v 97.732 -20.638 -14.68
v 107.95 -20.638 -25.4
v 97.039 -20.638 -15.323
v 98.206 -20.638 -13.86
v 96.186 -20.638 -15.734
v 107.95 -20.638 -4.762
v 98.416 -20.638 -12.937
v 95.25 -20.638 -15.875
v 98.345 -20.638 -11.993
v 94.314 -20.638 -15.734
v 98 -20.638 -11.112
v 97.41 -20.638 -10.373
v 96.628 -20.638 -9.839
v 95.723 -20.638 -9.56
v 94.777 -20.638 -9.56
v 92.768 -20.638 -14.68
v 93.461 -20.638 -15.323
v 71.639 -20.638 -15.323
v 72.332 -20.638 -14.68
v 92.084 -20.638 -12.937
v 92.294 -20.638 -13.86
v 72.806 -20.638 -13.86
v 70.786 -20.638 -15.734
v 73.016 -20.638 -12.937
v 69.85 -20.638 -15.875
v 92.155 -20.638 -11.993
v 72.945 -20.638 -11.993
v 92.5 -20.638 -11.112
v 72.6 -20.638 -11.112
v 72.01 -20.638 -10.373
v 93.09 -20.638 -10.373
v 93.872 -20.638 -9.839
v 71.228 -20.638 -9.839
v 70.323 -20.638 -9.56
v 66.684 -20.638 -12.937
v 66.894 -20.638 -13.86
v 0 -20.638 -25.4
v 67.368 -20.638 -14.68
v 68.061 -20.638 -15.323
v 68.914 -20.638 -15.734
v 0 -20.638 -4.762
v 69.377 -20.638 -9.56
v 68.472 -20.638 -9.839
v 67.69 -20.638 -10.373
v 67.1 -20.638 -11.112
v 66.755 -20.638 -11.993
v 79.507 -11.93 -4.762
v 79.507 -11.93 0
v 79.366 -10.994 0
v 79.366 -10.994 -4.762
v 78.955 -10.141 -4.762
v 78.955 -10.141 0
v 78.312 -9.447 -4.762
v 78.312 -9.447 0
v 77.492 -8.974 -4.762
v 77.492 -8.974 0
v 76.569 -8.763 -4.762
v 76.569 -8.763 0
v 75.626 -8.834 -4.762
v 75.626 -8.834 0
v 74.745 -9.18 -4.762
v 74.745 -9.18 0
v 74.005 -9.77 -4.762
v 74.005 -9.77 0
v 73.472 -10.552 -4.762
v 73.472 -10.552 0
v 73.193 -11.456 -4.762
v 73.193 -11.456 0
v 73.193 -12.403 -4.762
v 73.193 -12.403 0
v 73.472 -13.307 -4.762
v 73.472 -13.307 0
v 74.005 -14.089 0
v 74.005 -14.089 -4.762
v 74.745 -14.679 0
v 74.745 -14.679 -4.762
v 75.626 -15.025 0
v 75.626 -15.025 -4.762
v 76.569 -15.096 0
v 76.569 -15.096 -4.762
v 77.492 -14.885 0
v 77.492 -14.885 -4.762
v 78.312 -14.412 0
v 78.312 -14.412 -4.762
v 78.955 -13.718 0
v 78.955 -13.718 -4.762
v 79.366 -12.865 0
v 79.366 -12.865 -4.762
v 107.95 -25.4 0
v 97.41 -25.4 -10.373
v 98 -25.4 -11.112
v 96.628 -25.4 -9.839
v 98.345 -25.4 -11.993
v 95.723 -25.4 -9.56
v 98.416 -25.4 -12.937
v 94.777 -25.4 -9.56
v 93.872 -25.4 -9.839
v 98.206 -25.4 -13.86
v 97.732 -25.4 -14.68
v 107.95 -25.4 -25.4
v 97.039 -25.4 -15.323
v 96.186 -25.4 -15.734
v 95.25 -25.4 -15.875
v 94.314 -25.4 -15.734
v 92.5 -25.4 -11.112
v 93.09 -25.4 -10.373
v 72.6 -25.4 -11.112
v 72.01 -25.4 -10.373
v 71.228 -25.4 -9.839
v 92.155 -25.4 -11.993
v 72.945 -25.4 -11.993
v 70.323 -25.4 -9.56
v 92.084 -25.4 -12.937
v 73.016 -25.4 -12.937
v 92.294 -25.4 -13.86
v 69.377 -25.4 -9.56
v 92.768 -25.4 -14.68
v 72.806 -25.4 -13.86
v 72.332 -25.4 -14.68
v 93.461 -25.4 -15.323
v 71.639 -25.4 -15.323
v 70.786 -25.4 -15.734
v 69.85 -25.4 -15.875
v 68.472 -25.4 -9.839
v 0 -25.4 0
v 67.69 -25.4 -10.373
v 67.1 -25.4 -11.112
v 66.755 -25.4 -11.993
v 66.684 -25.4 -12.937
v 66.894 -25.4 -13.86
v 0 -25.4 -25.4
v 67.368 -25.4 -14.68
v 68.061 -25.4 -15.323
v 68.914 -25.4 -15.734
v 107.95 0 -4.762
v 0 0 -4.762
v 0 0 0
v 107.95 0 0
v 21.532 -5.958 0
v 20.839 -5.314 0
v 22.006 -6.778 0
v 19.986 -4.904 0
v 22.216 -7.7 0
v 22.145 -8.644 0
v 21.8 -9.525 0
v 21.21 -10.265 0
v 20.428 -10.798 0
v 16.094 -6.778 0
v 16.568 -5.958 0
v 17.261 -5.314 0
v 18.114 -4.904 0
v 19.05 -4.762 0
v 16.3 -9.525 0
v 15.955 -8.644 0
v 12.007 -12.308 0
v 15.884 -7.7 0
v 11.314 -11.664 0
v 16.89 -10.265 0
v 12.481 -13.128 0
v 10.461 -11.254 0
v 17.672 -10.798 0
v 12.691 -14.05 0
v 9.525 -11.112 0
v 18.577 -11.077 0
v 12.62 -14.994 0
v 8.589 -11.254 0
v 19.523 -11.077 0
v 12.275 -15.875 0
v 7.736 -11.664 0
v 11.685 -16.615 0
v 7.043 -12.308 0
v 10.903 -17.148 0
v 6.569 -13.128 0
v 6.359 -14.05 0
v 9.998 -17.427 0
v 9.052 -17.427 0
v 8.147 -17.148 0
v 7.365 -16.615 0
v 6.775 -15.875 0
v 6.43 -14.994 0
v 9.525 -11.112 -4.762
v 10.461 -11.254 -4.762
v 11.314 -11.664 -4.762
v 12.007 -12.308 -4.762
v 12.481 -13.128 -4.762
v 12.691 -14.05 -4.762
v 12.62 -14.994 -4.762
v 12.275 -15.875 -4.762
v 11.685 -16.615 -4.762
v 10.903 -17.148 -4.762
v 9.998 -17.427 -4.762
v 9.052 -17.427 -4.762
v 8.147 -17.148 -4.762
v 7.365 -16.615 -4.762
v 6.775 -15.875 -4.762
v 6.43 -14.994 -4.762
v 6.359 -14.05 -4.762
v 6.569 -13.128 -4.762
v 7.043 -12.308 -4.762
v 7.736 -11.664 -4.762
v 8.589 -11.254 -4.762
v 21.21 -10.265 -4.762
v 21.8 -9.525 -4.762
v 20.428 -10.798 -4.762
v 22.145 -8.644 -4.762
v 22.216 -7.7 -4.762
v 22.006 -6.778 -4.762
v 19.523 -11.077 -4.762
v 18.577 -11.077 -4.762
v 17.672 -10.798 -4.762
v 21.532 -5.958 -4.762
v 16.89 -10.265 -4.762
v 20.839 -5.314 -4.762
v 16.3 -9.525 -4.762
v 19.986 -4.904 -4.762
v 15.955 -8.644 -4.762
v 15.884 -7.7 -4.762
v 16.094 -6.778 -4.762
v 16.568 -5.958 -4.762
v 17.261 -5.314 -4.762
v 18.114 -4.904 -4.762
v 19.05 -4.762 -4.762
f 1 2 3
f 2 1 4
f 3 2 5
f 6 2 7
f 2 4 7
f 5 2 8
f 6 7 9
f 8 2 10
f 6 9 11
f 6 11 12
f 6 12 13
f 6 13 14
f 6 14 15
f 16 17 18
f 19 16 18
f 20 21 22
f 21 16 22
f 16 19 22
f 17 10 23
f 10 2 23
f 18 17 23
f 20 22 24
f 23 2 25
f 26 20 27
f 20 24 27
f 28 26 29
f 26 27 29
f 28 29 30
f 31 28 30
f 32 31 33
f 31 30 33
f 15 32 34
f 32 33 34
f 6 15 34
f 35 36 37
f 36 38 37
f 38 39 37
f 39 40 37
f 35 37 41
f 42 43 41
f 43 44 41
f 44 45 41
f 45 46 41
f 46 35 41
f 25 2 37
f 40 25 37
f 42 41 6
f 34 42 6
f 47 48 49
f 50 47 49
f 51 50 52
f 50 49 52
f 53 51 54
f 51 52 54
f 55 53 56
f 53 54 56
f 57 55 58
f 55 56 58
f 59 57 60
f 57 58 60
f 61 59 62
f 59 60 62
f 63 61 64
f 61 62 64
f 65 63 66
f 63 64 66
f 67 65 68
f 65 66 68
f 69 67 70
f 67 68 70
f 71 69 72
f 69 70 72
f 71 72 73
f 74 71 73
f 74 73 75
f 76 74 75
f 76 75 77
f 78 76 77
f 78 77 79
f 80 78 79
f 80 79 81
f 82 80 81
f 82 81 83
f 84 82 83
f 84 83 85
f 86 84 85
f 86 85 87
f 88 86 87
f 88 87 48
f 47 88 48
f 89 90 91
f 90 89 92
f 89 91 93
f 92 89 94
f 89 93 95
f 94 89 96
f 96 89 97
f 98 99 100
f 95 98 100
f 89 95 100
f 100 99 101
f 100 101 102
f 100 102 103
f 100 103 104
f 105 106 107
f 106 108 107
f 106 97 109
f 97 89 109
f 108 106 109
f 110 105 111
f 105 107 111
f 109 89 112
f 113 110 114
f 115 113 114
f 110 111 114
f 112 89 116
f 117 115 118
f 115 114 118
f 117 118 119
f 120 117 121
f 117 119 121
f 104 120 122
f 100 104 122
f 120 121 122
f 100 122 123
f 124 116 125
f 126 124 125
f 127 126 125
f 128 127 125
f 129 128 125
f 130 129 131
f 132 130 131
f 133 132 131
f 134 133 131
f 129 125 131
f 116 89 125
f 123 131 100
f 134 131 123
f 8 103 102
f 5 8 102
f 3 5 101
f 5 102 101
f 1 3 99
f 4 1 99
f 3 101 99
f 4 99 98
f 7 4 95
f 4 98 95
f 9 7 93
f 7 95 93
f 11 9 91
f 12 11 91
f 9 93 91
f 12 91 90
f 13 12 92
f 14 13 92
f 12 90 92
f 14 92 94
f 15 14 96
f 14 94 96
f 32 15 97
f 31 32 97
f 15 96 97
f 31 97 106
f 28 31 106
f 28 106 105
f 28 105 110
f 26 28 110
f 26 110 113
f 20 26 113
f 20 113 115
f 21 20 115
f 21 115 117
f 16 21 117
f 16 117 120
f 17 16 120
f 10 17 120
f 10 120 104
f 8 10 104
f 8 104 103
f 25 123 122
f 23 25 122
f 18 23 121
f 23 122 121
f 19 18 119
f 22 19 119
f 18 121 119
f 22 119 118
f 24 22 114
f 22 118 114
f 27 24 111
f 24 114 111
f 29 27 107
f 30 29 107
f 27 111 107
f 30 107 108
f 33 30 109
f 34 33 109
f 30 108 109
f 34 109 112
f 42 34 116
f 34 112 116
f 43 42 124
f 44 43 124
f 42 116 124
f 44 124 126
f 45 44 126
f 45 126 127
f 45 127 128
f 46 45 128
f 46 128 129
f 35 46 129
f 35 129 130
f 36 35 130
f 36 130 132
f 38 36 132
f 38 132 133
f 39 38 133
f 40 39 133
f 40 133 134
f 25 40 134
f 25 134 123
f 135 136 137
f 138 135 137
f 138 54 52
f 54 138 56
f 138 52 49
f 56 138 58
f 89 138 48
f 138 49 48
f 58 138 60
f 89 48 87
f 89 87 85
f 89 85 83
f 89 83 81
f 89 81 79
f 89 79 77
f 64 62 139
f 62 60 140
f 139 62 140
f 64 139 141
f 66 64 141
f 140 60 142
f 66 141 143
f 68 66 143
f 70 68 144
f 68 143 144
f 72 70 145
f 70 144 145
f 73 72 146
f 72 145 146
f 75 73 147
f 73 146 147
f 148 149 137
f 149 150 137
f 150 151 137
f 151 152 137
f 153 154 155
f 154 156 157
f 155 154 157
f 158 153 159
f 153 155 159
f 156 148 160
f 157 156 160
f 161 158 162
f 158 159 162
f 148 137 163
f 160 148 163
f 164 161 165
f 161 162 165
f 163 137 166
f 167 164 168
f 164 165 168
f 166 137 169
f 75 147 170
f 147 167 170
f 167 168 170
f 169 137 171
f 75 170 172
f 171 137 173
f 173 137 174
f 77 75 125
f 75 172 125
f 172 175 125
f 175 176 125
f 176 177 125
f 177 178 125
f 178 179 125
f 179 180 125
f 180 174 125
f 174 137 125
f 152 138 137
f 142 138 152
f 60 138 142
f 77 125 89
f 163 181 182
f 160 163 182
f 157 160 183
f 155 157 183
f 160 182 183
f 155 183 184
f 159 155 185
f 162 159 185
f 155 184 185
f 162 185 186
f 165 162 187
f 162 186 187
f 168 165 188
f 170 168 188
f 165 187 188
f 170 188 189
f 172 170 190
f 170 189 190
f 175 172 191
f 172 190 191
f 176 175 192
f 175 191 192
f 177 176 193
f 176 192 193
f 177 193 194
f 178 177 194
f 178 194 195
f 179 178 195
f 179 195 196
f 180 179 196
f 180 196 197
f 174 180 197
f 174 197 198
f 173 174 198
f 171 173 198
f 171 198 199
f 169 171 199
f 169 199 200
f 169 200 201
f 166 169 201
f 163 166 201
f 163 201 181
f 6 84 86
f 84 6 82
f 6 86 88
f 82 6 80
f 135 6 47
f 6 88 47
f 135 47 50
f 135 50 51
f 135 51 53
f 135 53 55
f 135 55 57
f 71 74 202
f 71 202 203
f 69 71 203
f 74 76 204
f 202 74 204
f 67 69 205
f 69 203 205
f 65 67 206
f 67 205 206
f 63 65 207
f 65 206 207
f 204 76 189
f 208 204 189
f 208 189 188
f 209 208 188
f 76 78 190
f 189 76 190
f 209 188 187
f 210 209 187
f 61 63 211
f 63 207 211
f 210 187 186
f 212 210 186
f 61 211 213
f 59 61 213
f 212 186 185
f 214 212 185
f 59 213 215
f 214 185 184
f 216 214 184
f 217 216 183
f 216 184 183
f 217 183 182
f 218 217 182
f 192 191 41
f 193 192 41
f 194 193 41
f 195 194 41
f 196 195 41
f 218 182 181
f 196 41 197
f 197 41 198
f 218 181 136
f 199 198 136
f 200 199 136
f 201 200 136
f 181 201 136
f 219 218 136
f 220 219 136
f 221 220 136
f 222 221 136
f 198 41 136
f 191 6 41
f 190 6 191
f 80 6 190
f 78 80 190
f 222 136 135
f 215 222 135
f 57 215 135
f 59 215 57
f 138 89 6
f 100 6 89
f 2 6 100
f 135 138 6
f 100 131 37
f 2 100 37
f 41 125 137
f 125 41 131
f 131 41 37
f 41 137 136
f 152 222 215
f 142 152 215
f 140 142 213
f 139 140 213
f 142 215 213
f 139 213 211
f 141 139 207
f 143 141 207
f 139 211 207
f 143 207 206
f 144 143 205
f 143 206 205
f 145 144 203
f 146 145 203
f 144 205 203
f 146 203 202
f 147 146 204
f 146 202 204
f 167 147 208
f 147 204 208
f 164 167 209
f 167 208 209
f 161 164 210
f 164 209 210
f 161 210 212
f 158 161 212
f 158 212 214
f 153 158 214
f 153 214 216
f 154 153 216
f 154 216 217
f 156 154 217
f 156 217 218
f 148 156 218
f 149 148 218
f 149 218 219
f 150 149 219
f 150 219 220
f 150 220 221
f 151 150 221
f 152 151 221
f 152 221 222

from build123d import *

# Parameters (mm, degrees)
BOSS_EXTRUDE1_DEPTH = 107.95
CUT_EXTRUDE1_REACH  = 114.802
SKETCH3_R           = 3.175
CUT_EXTRUDE2_REACH  = 115.77
SKETCH4_R           = 3.175
CUT_EXTRUDE4_REACH  = 115.77
SKETCH5_R           = 3.175


with BuildPart() as part:
    # Sketch1 → Boss-Extrude1 (new body)
    with BuildSketch(Plane(origin=(0, 0, 0), x_dir=(0, 0, -1), z_dir=(1, 0, 0))):
        Polygon((0, 0), (0, -25.4), (25.4, -25.4), (25.4, -20.6375), (4.7625, -20.6375), (4.7625, 0), align=None)
    extrude(amount=BOSS_EXTRUDE1_DEPTH)

    # Sketch3 → Cut-Extrude1 (cut, up to next)
    with BuildSketch(Plane(origin=(0, 0, -4.7625), x_dir=(-1, 0, 0), z_dir=(0, 0, -1)), mode=Mode.PRIVATE) as cut_extrude1_sk1:
        with Locations(Location((-9.525, -14.2875, 0), (0, 0, 90))):
            Circle(SKETCH3_R)
    cut_extrude1_tool1 = extrude(cut_extrude1_sk1.sketch, amount=-CUT_EXTRUDE1_REACH, mode=Mode.PRIVATE) & part.part
    # Sketch3 → Cut-Extrude1 (cut, up to next)
    with BuildSketch(Plane(origin=(0, 0, -4.7625), x_dir=(-1, 0, 0), z_dir=(0, 0, -1)), mode=Mode.PRIVATE) as cut_extrude1_sk2:
        with Locations(Location((-19.05, -7.9375, 0), (0, 0, 90))):
            Circle(SKETCH3_R)
    cut_extrude1_tool2 = extrude(cut_extrude1_sk2.sketch, amount=-CUT_EXTRUDE1_REACH, mode=Mode.PRIVATE) & part.part
    add(cut_extrude1_tool1.solids().sort_by_distance((9.525, -14.2875, -4.7625))[0], mode=Mode.SUBTRACT)
    add(cut_extrude1_tool2.solids().sort_by_distance((19.05, -7.9375, -4.7625))[0], mode=Mode.SUBTRACT)

    # Sketch4 → Cut-Extrude2 (cut, up to next)
    with BuildSketch(Plane.XY, mode=Mode.PRIVATE) as cut_extrude2_sk1:
        with Locations((76.332177029, -11.929615818)):
            Circle(SKETCH4_R)
    cut_extrude2_tool1 = extrude(cut_extrude2_sk1.sketch, amount=-CUT_EXTRUDE2_REACH, mode=Mode.PRIVATE) & part.part
    add(cut_extrude2_tool1.solids().sort_by_distance((76.332177, -11.929616, 0))[0], mode=Mode.SUBTRACT)

    # Sketch5 → Cut-Extrude4 (cut, up to next)
    with BuildSketch(Plane.XZ.offset(25.4), mode=Mode.PRIVATE) as cut_extrude4_sk1:
        with Locations(Location((69.85, -12.7, 0), (0, 0, 270))):
            Circle(SKETCH5_R)
    cut_extrude4_tool1 = extrude(cut_extrude4_sk1.sketch, amount=-CUT_EXTRUDE4_REACH, mode=Mode.PRIVATE) & part.part
    # Sketch5 → Cut-Extrude4 (cut, up to next)
    with BuildSketch(Plane.XZ.offset(25.4), mode=Mode.PRIVATE) as cut_extrude4_sk2:
        with Locations(Location((95.25, -12.7, 0), (0, 0, 270))):
            Circle(SKETCH5_R)
    cut_extrude4_tool2 = extrude(cut_extrude4_sk2.sketch, amount=-CUT_EXTRUDE4_REACH, mode=Mode.PRIVATE) & part.part
    add(cut_extrude4_tool1.solids().sort_by_distance((69.85, -25.4, -12.7))[0], mode=Mode.SUBTRACT)
    add(cut_extrude4_tool2.solids().sort_by_distance((95.25, -25.4, -12.7))[0], mode=Mode.SUBTRACT)


solid = part.part
